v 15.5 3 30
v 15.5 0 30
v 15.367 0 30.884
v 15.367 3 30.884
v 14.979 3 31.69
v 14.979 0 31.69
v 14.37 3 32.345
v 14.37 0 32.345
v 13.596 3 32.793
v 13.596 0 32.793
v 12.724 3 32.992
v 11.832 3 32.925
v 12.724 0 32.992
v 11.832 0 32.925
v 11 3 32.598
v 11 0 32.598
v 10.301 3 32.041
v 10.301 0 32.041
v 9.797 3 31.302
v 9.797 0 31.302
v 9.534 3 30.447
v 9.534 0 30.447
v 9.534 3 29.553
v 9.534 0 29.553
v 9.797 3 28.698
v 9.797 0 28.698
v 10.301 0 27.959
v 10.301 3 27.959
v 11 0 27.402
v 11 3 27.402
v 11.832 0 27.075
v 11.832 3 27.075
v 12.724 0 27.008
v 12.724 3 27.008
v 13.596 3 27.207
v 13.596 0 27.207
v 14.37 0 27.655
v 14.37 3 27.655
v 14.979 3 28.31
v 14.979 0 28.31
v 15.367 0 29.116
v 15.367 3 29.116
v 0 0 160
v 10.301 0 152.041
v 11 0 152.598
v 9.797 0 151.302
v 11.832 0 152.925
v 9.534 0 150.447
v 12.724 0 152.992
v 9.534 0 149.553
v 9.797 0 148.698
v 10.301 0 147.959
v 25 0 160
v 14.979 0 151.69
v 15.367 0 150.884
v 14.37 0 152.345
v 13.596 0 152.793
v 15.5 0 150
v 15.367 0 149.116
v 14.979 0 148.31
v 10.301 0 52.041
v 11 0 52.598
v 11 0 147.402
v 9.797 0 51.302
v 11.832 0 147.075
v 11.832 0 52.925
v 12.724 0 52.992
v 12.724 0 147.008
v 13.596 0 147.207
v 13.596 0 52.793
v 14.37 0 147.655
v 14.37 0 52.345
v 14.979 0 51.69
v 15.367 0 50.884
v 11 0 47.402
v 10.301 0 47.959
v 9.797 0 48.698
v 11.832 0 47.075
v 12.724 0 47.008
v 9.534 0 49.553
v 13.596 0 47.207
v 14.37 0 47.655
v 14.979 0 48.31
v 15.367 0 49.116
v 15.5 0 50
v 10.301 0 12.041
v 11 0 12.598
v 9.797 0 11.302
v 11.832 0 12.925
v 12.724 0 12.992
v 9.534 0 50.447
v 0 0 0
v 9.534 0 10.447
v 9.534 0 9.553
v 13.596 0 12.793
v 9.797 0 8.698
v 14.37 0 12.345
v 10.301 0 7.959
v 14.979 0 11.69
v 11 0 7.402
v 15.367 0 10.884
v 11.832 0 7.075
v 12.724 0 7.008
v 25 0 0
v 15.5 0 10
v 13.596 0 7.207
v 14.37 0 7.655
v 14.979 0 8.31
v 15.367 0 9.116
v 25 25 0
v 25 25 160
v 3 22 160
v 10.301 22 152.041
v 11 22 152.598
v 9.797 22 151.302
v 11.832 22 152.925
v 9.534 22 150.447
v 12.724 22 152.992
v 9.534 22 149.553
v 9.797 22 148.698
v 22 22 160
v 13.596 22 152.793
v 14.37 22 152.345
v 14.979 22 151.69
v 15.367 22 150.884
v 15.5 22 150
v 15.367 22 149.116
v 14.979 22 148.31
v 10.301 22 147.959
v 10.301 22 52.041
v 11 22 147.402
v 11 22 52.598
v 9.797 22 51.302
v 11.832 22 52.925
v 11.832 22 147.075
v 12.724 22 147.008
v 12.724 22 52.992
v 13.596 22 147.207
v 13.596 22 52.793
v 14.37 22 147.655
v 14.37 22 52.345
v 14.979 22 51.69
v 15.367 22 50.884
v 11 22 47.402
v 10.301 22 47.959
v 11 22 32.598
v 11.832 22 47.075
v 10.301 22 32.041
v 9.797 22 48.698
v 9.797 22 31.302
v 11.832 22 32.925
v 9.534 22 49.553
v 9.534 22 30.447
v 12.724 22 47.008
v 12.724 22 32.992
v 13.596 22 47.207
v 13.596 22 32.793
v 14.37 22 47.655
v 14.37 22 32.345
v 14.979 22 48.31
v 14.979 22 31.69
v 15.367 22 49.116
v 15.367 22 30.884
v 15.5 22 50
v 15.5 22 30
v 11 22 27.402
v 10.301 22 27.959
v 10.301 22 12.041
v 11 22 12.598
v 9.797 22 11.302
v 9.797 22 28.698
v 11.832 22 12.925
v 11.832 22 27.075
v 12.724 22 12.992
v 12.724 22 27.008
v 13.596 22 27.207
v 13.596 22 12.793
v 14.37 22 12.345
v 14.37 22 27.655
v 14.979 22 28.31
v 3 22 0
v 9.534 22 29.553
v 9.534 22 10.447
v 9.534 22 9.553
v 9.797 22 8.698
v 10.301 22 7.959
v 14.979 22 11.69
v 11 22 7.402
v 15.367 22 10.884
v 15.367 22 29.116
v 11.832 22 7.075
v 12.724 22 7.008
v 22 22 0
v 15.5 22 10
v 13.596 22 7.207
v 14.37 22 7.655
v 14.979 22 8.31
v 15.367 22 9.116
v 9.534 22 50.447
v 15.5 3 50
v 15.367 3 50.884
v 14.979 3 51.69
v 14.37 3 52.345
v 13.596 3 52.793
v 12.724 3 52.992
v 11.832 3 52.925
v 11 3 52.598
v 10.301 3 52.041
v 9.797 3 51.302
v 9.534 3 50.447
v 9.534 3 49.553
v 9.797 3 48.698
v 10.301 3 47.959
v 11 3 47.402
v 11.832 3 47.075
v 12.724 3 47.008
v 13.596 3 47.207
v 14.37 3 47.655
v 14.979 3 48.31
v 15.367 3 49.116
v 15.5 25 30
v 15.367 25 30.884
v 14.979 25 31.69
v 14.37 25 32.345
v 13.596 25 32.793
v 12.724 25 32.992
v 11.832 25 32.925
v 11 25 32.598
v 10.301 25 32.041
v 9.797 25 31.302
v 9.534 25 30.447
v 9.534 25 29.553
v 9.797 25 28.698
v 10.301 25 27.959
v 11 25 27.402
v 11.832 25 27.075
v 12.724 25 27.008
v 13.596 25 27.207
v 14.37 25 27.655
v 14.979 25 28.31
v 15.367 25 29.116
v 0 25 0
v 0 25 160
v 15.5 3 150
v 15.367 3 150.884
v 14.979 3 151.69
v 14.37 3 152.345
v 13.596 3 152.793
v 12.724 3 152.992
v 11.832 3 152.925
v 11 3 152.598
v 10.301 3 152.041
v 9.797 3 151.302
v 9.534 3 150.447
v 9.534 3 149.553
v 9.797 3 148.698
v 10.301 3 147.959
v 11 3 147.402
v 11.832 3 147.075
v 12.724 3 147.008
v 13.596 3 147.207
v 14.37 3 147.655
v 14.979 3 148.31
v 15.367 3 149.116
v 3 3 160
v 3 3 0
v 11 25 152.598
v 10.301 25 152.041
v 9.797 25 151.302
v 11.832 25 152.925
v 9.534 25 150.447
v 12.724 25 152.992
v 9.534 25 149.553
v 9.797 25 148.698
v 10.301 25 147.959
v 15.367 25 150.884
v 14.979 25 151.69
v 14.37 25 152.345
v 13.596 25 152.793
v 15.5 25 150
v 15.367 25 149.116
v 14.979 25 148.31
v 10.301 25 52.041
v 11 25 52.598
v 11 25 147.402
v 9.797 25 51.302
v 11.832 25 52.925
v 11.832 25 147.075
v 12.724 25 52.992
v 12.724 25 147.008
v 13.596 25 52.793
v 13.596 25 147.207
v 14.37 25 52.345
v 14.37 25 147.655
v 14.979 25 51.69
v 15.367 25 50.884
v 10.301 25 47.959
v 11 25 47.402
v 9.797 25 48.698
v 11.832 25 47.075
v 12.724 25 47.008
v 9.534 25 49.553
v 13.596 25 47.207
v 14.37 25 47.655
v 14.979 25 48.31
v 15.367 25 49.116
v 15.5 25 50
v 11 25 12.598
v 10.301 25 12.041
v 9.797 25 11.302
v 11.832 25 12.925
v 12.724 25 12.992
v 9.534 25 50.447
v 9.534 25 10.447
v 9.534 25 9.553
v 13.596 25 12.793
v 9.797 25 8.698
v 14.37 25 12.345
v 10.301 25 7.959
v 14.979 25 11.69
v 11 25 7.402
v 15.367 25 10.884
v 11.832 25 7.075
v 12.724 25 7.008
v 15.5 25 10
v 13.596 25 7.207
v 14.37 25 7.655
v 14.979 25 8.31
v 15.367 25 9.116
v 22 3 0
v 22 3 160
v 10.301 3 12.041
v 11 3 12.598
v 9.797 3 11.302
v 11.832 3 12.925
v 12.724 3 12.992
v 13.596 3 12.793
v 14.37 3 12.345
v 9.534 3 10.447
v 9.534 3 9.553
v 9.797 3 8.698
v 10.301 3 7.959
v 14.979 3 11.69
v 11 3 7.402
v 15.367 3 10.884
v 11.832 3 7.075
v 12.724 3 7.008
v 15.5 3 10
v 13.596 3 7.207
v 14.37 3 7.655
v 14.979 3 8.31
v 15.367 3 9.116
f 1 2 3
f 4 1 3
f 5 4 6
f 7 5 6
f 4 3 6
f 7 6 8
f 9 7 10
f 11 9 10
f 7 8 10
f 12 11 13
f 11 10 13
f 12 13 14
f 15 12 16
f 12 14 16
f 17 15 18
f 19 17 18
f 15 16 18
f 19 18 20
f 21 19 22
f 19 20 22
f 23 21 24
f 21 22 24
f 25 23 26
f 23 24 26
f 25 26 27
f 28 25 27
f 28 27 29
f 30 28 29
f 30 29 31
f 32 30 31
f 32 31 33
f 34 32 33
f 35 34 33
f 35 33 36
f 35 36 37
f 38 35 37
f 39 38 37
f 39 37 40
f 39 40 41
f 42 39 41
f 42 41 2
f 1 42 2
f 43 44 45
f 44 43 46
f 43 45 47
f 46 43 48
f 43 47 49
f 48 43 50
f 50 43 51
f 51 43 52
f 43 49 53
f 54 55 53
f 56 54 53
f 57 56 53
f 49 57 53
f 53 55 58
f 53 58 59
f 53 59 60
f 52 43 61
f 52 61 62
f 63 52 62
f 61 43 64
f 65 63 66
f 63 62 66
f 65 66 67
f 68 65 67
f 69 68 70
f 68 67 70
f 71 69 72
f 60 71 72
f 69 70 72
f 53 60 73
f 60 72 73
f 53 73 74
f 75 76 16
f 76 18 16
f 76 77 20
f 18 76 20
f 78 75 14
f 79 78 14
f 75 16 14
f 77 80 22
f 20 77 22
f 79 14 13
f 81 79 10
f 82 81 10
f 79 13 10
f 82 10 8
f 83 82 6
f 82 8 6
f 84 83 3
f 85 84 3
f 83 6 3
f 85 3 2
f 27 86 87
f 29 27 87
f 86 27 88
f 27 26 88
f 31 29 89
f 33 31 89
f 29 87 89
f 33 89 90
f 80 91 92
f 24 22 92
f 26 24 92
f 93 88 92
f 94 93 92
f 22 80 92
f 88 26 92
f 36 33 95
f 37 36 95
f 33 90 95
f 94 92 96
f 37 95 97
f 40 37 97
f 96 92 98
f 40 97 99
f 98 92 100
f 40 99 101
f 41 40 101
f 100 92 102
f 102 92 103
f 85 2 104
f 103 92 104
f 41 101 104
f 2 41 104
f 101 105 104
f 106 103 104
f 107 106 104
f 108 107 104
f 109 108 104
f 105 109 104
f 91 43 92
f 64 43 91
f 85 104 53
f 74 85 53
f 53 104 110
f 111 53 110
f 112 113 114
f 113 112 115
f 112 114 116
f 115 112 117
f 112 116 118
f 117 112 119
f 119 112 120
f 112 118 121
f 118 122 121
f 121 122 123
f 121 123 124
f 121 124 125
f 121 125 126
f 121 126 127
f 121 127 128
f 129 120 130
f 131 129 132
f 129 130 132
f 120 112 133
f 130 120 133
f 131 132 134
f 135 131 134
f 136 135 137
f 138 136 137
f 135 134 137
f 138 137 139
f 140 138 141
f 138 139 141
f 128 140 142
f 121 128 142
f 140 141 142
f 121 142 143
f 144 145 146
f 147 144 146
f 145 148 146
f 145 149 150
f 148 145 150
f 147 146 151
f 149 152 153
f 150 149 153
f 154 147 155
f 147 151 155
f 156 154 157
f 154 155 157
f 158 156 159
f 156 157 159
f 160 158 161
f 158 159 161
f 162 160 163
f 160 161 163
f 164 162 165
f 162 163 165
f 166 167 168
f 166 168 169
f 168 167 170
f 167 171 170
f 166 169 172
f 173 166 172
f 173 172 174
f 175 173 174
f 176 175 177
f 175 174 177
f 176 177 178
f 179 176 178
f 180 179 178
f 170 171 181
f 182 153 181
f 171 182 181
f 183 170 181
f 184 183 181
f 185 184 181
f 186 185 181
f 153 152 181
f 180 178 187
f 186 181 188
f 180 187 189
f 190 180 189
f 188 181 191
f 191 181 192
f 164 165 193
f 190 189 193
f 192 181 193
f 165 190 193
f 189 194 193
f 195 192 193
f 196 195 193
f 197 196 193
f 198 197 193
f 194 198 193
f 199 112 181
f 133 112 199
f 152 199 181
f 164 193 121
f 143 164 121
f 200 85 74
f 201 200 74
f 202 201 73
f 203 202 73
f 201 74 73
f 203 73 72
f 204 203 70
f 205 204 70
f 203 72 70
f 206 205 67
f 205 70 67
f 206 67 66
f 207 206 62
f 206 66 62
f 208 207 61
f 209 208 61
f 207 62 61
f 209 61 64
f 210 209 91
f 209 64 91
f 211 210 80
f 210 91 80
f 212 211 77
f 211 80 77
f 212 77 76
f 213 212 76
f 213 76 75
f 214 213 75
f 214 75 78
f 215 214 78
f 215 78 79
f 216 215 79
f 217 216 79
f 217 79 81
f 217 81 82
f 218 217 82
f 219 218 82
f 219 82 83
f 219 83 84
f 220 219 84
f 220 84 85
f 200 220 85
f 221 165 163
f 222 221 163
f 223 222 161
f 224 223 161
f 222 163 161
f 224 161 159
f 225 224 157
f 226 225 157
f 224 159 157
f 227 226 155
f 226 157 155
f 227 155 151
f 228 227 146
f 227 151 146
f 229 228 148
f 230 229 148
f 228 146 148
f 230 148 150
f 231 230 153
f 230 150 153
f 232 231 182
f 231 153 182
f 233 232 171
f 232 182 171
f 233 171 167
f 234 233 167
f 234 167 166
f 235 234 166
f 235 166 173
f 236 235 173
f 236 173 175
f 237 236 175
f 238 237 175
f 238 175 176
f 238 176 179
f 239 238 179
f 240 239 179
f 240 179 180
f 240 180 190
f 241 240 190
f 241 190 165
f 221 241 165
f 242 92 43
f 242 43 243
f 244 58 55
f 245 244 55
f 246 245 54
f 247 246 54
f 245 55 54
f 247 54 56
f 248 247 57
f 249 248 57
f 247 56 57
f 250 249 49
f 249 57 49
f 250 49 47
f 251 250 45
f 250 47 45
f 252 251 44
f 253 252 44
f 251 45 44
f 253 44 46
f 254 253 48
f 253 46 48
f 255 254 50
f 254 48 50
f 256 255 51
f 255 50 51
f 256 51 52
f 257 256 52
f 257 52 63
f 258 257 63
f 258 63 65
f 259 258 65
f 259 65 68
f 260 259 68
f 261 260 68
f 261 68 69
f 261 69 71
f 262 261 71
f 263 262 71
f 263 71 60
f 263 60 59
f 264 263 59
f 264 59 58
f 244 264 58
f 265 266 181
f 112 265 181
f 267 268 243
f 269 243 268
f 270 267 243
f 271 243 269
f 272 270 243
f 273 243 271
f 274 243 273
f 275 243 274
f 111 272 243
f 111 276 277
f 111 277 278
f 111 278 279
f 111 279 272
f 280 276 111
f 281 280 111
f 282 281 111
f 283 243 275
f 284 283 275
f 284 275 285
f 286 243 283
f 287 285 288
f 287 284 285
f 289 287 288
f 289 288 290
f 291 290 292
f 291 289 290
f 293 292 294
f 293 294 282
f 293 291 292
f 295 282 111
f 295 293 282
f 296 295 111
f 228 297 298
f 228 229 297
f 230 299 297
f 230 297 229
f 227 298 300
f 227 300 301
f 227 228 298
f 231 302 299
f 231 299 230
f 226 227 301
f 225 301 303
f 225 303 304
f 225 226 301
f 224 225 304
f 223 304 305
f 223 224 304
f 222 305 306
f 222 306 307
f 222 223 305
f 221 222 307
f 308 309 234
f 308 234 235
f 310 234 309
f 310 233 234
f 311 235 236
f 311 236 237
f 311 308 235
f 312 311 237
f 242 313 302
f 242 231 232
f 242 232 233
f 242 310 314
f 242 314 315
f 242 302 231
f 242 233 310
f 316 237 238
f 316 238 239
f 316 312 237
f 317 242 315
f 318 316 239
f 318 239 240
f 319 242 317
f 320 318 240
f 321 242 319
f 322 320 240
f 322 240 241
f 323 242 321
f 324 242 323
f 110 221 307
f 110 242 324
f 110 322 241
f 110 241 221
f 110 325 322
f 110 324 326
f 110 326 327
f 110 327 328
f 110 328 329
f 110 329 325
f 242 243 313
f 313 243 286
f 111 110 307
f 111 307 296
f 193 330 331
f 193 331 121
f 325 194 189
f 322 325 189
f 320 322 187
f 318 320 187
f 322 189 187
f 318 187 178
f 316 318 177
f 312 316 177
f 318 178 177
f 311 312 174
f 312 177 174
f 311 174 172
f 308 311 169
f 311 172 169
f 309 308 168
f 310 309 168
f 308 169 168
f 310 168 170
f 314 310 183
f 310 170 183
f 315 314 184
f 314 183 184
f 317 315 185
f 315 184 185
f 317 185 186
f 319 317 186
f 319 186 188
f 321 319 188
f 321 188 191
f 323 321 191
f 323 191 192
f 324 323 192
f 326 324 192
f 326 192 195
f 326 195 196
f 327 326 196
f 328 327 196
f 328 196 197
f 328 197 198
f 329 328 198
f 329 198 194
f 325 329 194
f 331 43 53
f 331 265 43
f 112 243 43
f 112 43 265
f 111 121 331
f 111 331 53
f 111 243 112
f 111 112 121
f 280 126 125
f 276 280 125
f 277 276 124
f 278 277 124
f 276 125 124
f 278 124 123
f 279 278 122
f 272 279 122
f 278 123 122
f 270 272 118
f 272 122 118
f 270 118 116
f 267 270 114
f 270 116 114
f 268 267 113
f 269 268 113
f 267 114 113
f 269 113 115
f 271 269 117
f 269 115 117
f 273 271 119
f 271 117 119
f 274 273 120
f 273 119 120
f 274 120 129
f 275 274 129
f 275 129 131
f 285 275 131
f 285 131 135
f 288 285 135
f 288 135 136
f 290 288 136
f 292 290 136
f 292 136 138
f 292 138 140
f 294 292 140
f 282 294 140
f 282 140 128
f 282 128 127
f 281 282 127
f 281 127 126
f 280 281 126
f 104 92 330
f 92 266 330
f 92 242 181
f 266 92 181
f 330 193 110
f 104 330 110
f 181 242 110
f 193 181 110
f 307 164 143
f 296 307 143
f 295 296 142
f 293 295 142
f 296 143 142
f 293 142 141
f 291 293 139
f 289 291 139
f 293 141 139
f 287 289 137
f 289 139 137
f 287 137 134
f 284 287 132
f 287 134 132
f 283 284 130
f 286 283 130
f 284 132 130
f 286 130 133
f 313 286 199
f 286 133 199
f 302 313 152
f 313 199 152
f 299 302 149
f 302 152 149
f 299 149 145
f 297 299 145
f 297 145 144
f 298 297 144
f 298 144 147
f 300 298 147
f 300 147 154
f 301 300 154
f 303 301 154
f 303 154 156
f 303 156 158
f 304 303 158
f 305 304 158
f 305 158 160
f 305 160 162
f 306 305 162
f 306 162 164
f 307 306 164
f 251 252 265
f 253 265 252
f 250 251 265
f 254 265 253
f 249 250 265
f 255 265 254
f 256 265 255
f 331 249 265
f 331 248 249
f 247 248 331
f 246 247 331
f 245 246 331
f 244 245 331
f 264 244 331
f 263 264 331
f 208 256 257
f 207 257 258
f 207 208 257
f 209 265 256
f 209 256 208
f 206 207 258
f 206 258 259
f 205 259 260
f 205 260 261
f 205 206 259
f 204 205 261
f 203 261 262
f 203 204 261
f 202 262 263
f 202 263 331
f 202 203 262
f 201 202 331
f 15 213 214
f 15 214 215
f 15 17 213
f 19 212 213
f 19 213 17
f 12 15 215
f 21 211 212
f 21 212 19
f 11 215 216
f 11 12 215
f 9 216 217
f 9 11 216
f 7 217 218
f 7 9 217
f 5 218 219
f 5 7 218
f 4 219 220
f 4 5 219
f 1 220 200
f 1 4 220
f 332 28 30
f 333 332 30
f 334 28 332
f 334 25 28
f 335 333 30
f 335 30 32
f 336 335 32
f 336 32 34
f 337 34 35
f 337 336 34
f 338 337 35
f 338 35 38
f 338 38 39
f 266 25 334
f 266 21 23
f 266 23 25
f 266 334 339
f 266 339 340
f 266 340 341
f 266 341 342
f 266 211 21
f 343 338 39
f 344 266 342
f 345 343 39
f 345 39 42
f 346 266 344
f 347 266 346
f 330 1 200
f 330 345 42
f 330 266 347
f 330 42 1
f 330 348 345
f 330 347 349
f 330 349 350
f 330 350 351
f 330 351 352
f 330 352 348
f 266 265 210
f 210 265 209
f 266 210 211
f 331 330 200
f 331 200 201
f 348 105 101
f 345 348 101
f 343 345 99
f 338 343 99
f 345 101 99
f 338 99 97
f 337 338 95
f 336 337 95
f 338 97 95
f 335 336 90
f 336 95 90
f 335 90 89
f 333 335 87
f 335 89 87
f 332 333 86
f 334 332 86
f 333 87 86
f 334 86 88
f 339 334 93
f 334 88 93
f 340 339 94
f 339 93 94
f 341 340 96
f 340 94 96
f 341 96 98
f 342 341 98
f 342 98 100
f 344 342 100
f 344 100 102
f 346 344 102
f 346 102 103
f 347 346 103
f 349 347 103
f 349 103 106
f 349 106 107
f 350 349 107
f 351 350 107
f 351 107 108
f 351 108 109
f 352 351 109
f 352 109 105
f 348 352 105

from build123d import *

# Parameters (mm, degrees)
SKETCH1_W           = 25
SKETCH1_H           = 25
SKETCH1_W_2         = 19
SKETCH1_H_2         = 19
BOSS_EXTRUDE1_DEPTH = 160
SKETCH2_R           = 3
CUT_EXTRUDE1_DEPTH  = 26


with BuildPart() as part:
    # Sketch1 → Boss-Extrude1 (new body)
    with BuildSketch(Plane.XY):
        with Locations((12.5, 12.5)):
            Rectangle(SKETCH1_W, SKETCH1_H)
        with Locations((12.5, 12.5)):
            Rectangle(SKETCH1_W_2, SKETCH1_H_2, mode=Mode.SUBTRACT)
    extrude(amount=BOSS_EXTRUDE1_DEPTH)

    # Sketch2 → Cut-Extrude1 (cut, through all)
    with BuildSketch(Plane.XZ):
        with Locations((12.5, 10)):
            Circle(SKETCH2_R)
        with Locations((12.5, 30)):
            Circle(SKETCH2_R)
        with Locations((12.5, 50)):
            Circle(SKETCH2_R)
        with Locations((12.5, 150)):
            Circle(SKETCH2_R)
    extrude(amount=-CUT_EXTRUDE1_DEPTH, mode=Mode.SUBTRACT)


solid = part.part
